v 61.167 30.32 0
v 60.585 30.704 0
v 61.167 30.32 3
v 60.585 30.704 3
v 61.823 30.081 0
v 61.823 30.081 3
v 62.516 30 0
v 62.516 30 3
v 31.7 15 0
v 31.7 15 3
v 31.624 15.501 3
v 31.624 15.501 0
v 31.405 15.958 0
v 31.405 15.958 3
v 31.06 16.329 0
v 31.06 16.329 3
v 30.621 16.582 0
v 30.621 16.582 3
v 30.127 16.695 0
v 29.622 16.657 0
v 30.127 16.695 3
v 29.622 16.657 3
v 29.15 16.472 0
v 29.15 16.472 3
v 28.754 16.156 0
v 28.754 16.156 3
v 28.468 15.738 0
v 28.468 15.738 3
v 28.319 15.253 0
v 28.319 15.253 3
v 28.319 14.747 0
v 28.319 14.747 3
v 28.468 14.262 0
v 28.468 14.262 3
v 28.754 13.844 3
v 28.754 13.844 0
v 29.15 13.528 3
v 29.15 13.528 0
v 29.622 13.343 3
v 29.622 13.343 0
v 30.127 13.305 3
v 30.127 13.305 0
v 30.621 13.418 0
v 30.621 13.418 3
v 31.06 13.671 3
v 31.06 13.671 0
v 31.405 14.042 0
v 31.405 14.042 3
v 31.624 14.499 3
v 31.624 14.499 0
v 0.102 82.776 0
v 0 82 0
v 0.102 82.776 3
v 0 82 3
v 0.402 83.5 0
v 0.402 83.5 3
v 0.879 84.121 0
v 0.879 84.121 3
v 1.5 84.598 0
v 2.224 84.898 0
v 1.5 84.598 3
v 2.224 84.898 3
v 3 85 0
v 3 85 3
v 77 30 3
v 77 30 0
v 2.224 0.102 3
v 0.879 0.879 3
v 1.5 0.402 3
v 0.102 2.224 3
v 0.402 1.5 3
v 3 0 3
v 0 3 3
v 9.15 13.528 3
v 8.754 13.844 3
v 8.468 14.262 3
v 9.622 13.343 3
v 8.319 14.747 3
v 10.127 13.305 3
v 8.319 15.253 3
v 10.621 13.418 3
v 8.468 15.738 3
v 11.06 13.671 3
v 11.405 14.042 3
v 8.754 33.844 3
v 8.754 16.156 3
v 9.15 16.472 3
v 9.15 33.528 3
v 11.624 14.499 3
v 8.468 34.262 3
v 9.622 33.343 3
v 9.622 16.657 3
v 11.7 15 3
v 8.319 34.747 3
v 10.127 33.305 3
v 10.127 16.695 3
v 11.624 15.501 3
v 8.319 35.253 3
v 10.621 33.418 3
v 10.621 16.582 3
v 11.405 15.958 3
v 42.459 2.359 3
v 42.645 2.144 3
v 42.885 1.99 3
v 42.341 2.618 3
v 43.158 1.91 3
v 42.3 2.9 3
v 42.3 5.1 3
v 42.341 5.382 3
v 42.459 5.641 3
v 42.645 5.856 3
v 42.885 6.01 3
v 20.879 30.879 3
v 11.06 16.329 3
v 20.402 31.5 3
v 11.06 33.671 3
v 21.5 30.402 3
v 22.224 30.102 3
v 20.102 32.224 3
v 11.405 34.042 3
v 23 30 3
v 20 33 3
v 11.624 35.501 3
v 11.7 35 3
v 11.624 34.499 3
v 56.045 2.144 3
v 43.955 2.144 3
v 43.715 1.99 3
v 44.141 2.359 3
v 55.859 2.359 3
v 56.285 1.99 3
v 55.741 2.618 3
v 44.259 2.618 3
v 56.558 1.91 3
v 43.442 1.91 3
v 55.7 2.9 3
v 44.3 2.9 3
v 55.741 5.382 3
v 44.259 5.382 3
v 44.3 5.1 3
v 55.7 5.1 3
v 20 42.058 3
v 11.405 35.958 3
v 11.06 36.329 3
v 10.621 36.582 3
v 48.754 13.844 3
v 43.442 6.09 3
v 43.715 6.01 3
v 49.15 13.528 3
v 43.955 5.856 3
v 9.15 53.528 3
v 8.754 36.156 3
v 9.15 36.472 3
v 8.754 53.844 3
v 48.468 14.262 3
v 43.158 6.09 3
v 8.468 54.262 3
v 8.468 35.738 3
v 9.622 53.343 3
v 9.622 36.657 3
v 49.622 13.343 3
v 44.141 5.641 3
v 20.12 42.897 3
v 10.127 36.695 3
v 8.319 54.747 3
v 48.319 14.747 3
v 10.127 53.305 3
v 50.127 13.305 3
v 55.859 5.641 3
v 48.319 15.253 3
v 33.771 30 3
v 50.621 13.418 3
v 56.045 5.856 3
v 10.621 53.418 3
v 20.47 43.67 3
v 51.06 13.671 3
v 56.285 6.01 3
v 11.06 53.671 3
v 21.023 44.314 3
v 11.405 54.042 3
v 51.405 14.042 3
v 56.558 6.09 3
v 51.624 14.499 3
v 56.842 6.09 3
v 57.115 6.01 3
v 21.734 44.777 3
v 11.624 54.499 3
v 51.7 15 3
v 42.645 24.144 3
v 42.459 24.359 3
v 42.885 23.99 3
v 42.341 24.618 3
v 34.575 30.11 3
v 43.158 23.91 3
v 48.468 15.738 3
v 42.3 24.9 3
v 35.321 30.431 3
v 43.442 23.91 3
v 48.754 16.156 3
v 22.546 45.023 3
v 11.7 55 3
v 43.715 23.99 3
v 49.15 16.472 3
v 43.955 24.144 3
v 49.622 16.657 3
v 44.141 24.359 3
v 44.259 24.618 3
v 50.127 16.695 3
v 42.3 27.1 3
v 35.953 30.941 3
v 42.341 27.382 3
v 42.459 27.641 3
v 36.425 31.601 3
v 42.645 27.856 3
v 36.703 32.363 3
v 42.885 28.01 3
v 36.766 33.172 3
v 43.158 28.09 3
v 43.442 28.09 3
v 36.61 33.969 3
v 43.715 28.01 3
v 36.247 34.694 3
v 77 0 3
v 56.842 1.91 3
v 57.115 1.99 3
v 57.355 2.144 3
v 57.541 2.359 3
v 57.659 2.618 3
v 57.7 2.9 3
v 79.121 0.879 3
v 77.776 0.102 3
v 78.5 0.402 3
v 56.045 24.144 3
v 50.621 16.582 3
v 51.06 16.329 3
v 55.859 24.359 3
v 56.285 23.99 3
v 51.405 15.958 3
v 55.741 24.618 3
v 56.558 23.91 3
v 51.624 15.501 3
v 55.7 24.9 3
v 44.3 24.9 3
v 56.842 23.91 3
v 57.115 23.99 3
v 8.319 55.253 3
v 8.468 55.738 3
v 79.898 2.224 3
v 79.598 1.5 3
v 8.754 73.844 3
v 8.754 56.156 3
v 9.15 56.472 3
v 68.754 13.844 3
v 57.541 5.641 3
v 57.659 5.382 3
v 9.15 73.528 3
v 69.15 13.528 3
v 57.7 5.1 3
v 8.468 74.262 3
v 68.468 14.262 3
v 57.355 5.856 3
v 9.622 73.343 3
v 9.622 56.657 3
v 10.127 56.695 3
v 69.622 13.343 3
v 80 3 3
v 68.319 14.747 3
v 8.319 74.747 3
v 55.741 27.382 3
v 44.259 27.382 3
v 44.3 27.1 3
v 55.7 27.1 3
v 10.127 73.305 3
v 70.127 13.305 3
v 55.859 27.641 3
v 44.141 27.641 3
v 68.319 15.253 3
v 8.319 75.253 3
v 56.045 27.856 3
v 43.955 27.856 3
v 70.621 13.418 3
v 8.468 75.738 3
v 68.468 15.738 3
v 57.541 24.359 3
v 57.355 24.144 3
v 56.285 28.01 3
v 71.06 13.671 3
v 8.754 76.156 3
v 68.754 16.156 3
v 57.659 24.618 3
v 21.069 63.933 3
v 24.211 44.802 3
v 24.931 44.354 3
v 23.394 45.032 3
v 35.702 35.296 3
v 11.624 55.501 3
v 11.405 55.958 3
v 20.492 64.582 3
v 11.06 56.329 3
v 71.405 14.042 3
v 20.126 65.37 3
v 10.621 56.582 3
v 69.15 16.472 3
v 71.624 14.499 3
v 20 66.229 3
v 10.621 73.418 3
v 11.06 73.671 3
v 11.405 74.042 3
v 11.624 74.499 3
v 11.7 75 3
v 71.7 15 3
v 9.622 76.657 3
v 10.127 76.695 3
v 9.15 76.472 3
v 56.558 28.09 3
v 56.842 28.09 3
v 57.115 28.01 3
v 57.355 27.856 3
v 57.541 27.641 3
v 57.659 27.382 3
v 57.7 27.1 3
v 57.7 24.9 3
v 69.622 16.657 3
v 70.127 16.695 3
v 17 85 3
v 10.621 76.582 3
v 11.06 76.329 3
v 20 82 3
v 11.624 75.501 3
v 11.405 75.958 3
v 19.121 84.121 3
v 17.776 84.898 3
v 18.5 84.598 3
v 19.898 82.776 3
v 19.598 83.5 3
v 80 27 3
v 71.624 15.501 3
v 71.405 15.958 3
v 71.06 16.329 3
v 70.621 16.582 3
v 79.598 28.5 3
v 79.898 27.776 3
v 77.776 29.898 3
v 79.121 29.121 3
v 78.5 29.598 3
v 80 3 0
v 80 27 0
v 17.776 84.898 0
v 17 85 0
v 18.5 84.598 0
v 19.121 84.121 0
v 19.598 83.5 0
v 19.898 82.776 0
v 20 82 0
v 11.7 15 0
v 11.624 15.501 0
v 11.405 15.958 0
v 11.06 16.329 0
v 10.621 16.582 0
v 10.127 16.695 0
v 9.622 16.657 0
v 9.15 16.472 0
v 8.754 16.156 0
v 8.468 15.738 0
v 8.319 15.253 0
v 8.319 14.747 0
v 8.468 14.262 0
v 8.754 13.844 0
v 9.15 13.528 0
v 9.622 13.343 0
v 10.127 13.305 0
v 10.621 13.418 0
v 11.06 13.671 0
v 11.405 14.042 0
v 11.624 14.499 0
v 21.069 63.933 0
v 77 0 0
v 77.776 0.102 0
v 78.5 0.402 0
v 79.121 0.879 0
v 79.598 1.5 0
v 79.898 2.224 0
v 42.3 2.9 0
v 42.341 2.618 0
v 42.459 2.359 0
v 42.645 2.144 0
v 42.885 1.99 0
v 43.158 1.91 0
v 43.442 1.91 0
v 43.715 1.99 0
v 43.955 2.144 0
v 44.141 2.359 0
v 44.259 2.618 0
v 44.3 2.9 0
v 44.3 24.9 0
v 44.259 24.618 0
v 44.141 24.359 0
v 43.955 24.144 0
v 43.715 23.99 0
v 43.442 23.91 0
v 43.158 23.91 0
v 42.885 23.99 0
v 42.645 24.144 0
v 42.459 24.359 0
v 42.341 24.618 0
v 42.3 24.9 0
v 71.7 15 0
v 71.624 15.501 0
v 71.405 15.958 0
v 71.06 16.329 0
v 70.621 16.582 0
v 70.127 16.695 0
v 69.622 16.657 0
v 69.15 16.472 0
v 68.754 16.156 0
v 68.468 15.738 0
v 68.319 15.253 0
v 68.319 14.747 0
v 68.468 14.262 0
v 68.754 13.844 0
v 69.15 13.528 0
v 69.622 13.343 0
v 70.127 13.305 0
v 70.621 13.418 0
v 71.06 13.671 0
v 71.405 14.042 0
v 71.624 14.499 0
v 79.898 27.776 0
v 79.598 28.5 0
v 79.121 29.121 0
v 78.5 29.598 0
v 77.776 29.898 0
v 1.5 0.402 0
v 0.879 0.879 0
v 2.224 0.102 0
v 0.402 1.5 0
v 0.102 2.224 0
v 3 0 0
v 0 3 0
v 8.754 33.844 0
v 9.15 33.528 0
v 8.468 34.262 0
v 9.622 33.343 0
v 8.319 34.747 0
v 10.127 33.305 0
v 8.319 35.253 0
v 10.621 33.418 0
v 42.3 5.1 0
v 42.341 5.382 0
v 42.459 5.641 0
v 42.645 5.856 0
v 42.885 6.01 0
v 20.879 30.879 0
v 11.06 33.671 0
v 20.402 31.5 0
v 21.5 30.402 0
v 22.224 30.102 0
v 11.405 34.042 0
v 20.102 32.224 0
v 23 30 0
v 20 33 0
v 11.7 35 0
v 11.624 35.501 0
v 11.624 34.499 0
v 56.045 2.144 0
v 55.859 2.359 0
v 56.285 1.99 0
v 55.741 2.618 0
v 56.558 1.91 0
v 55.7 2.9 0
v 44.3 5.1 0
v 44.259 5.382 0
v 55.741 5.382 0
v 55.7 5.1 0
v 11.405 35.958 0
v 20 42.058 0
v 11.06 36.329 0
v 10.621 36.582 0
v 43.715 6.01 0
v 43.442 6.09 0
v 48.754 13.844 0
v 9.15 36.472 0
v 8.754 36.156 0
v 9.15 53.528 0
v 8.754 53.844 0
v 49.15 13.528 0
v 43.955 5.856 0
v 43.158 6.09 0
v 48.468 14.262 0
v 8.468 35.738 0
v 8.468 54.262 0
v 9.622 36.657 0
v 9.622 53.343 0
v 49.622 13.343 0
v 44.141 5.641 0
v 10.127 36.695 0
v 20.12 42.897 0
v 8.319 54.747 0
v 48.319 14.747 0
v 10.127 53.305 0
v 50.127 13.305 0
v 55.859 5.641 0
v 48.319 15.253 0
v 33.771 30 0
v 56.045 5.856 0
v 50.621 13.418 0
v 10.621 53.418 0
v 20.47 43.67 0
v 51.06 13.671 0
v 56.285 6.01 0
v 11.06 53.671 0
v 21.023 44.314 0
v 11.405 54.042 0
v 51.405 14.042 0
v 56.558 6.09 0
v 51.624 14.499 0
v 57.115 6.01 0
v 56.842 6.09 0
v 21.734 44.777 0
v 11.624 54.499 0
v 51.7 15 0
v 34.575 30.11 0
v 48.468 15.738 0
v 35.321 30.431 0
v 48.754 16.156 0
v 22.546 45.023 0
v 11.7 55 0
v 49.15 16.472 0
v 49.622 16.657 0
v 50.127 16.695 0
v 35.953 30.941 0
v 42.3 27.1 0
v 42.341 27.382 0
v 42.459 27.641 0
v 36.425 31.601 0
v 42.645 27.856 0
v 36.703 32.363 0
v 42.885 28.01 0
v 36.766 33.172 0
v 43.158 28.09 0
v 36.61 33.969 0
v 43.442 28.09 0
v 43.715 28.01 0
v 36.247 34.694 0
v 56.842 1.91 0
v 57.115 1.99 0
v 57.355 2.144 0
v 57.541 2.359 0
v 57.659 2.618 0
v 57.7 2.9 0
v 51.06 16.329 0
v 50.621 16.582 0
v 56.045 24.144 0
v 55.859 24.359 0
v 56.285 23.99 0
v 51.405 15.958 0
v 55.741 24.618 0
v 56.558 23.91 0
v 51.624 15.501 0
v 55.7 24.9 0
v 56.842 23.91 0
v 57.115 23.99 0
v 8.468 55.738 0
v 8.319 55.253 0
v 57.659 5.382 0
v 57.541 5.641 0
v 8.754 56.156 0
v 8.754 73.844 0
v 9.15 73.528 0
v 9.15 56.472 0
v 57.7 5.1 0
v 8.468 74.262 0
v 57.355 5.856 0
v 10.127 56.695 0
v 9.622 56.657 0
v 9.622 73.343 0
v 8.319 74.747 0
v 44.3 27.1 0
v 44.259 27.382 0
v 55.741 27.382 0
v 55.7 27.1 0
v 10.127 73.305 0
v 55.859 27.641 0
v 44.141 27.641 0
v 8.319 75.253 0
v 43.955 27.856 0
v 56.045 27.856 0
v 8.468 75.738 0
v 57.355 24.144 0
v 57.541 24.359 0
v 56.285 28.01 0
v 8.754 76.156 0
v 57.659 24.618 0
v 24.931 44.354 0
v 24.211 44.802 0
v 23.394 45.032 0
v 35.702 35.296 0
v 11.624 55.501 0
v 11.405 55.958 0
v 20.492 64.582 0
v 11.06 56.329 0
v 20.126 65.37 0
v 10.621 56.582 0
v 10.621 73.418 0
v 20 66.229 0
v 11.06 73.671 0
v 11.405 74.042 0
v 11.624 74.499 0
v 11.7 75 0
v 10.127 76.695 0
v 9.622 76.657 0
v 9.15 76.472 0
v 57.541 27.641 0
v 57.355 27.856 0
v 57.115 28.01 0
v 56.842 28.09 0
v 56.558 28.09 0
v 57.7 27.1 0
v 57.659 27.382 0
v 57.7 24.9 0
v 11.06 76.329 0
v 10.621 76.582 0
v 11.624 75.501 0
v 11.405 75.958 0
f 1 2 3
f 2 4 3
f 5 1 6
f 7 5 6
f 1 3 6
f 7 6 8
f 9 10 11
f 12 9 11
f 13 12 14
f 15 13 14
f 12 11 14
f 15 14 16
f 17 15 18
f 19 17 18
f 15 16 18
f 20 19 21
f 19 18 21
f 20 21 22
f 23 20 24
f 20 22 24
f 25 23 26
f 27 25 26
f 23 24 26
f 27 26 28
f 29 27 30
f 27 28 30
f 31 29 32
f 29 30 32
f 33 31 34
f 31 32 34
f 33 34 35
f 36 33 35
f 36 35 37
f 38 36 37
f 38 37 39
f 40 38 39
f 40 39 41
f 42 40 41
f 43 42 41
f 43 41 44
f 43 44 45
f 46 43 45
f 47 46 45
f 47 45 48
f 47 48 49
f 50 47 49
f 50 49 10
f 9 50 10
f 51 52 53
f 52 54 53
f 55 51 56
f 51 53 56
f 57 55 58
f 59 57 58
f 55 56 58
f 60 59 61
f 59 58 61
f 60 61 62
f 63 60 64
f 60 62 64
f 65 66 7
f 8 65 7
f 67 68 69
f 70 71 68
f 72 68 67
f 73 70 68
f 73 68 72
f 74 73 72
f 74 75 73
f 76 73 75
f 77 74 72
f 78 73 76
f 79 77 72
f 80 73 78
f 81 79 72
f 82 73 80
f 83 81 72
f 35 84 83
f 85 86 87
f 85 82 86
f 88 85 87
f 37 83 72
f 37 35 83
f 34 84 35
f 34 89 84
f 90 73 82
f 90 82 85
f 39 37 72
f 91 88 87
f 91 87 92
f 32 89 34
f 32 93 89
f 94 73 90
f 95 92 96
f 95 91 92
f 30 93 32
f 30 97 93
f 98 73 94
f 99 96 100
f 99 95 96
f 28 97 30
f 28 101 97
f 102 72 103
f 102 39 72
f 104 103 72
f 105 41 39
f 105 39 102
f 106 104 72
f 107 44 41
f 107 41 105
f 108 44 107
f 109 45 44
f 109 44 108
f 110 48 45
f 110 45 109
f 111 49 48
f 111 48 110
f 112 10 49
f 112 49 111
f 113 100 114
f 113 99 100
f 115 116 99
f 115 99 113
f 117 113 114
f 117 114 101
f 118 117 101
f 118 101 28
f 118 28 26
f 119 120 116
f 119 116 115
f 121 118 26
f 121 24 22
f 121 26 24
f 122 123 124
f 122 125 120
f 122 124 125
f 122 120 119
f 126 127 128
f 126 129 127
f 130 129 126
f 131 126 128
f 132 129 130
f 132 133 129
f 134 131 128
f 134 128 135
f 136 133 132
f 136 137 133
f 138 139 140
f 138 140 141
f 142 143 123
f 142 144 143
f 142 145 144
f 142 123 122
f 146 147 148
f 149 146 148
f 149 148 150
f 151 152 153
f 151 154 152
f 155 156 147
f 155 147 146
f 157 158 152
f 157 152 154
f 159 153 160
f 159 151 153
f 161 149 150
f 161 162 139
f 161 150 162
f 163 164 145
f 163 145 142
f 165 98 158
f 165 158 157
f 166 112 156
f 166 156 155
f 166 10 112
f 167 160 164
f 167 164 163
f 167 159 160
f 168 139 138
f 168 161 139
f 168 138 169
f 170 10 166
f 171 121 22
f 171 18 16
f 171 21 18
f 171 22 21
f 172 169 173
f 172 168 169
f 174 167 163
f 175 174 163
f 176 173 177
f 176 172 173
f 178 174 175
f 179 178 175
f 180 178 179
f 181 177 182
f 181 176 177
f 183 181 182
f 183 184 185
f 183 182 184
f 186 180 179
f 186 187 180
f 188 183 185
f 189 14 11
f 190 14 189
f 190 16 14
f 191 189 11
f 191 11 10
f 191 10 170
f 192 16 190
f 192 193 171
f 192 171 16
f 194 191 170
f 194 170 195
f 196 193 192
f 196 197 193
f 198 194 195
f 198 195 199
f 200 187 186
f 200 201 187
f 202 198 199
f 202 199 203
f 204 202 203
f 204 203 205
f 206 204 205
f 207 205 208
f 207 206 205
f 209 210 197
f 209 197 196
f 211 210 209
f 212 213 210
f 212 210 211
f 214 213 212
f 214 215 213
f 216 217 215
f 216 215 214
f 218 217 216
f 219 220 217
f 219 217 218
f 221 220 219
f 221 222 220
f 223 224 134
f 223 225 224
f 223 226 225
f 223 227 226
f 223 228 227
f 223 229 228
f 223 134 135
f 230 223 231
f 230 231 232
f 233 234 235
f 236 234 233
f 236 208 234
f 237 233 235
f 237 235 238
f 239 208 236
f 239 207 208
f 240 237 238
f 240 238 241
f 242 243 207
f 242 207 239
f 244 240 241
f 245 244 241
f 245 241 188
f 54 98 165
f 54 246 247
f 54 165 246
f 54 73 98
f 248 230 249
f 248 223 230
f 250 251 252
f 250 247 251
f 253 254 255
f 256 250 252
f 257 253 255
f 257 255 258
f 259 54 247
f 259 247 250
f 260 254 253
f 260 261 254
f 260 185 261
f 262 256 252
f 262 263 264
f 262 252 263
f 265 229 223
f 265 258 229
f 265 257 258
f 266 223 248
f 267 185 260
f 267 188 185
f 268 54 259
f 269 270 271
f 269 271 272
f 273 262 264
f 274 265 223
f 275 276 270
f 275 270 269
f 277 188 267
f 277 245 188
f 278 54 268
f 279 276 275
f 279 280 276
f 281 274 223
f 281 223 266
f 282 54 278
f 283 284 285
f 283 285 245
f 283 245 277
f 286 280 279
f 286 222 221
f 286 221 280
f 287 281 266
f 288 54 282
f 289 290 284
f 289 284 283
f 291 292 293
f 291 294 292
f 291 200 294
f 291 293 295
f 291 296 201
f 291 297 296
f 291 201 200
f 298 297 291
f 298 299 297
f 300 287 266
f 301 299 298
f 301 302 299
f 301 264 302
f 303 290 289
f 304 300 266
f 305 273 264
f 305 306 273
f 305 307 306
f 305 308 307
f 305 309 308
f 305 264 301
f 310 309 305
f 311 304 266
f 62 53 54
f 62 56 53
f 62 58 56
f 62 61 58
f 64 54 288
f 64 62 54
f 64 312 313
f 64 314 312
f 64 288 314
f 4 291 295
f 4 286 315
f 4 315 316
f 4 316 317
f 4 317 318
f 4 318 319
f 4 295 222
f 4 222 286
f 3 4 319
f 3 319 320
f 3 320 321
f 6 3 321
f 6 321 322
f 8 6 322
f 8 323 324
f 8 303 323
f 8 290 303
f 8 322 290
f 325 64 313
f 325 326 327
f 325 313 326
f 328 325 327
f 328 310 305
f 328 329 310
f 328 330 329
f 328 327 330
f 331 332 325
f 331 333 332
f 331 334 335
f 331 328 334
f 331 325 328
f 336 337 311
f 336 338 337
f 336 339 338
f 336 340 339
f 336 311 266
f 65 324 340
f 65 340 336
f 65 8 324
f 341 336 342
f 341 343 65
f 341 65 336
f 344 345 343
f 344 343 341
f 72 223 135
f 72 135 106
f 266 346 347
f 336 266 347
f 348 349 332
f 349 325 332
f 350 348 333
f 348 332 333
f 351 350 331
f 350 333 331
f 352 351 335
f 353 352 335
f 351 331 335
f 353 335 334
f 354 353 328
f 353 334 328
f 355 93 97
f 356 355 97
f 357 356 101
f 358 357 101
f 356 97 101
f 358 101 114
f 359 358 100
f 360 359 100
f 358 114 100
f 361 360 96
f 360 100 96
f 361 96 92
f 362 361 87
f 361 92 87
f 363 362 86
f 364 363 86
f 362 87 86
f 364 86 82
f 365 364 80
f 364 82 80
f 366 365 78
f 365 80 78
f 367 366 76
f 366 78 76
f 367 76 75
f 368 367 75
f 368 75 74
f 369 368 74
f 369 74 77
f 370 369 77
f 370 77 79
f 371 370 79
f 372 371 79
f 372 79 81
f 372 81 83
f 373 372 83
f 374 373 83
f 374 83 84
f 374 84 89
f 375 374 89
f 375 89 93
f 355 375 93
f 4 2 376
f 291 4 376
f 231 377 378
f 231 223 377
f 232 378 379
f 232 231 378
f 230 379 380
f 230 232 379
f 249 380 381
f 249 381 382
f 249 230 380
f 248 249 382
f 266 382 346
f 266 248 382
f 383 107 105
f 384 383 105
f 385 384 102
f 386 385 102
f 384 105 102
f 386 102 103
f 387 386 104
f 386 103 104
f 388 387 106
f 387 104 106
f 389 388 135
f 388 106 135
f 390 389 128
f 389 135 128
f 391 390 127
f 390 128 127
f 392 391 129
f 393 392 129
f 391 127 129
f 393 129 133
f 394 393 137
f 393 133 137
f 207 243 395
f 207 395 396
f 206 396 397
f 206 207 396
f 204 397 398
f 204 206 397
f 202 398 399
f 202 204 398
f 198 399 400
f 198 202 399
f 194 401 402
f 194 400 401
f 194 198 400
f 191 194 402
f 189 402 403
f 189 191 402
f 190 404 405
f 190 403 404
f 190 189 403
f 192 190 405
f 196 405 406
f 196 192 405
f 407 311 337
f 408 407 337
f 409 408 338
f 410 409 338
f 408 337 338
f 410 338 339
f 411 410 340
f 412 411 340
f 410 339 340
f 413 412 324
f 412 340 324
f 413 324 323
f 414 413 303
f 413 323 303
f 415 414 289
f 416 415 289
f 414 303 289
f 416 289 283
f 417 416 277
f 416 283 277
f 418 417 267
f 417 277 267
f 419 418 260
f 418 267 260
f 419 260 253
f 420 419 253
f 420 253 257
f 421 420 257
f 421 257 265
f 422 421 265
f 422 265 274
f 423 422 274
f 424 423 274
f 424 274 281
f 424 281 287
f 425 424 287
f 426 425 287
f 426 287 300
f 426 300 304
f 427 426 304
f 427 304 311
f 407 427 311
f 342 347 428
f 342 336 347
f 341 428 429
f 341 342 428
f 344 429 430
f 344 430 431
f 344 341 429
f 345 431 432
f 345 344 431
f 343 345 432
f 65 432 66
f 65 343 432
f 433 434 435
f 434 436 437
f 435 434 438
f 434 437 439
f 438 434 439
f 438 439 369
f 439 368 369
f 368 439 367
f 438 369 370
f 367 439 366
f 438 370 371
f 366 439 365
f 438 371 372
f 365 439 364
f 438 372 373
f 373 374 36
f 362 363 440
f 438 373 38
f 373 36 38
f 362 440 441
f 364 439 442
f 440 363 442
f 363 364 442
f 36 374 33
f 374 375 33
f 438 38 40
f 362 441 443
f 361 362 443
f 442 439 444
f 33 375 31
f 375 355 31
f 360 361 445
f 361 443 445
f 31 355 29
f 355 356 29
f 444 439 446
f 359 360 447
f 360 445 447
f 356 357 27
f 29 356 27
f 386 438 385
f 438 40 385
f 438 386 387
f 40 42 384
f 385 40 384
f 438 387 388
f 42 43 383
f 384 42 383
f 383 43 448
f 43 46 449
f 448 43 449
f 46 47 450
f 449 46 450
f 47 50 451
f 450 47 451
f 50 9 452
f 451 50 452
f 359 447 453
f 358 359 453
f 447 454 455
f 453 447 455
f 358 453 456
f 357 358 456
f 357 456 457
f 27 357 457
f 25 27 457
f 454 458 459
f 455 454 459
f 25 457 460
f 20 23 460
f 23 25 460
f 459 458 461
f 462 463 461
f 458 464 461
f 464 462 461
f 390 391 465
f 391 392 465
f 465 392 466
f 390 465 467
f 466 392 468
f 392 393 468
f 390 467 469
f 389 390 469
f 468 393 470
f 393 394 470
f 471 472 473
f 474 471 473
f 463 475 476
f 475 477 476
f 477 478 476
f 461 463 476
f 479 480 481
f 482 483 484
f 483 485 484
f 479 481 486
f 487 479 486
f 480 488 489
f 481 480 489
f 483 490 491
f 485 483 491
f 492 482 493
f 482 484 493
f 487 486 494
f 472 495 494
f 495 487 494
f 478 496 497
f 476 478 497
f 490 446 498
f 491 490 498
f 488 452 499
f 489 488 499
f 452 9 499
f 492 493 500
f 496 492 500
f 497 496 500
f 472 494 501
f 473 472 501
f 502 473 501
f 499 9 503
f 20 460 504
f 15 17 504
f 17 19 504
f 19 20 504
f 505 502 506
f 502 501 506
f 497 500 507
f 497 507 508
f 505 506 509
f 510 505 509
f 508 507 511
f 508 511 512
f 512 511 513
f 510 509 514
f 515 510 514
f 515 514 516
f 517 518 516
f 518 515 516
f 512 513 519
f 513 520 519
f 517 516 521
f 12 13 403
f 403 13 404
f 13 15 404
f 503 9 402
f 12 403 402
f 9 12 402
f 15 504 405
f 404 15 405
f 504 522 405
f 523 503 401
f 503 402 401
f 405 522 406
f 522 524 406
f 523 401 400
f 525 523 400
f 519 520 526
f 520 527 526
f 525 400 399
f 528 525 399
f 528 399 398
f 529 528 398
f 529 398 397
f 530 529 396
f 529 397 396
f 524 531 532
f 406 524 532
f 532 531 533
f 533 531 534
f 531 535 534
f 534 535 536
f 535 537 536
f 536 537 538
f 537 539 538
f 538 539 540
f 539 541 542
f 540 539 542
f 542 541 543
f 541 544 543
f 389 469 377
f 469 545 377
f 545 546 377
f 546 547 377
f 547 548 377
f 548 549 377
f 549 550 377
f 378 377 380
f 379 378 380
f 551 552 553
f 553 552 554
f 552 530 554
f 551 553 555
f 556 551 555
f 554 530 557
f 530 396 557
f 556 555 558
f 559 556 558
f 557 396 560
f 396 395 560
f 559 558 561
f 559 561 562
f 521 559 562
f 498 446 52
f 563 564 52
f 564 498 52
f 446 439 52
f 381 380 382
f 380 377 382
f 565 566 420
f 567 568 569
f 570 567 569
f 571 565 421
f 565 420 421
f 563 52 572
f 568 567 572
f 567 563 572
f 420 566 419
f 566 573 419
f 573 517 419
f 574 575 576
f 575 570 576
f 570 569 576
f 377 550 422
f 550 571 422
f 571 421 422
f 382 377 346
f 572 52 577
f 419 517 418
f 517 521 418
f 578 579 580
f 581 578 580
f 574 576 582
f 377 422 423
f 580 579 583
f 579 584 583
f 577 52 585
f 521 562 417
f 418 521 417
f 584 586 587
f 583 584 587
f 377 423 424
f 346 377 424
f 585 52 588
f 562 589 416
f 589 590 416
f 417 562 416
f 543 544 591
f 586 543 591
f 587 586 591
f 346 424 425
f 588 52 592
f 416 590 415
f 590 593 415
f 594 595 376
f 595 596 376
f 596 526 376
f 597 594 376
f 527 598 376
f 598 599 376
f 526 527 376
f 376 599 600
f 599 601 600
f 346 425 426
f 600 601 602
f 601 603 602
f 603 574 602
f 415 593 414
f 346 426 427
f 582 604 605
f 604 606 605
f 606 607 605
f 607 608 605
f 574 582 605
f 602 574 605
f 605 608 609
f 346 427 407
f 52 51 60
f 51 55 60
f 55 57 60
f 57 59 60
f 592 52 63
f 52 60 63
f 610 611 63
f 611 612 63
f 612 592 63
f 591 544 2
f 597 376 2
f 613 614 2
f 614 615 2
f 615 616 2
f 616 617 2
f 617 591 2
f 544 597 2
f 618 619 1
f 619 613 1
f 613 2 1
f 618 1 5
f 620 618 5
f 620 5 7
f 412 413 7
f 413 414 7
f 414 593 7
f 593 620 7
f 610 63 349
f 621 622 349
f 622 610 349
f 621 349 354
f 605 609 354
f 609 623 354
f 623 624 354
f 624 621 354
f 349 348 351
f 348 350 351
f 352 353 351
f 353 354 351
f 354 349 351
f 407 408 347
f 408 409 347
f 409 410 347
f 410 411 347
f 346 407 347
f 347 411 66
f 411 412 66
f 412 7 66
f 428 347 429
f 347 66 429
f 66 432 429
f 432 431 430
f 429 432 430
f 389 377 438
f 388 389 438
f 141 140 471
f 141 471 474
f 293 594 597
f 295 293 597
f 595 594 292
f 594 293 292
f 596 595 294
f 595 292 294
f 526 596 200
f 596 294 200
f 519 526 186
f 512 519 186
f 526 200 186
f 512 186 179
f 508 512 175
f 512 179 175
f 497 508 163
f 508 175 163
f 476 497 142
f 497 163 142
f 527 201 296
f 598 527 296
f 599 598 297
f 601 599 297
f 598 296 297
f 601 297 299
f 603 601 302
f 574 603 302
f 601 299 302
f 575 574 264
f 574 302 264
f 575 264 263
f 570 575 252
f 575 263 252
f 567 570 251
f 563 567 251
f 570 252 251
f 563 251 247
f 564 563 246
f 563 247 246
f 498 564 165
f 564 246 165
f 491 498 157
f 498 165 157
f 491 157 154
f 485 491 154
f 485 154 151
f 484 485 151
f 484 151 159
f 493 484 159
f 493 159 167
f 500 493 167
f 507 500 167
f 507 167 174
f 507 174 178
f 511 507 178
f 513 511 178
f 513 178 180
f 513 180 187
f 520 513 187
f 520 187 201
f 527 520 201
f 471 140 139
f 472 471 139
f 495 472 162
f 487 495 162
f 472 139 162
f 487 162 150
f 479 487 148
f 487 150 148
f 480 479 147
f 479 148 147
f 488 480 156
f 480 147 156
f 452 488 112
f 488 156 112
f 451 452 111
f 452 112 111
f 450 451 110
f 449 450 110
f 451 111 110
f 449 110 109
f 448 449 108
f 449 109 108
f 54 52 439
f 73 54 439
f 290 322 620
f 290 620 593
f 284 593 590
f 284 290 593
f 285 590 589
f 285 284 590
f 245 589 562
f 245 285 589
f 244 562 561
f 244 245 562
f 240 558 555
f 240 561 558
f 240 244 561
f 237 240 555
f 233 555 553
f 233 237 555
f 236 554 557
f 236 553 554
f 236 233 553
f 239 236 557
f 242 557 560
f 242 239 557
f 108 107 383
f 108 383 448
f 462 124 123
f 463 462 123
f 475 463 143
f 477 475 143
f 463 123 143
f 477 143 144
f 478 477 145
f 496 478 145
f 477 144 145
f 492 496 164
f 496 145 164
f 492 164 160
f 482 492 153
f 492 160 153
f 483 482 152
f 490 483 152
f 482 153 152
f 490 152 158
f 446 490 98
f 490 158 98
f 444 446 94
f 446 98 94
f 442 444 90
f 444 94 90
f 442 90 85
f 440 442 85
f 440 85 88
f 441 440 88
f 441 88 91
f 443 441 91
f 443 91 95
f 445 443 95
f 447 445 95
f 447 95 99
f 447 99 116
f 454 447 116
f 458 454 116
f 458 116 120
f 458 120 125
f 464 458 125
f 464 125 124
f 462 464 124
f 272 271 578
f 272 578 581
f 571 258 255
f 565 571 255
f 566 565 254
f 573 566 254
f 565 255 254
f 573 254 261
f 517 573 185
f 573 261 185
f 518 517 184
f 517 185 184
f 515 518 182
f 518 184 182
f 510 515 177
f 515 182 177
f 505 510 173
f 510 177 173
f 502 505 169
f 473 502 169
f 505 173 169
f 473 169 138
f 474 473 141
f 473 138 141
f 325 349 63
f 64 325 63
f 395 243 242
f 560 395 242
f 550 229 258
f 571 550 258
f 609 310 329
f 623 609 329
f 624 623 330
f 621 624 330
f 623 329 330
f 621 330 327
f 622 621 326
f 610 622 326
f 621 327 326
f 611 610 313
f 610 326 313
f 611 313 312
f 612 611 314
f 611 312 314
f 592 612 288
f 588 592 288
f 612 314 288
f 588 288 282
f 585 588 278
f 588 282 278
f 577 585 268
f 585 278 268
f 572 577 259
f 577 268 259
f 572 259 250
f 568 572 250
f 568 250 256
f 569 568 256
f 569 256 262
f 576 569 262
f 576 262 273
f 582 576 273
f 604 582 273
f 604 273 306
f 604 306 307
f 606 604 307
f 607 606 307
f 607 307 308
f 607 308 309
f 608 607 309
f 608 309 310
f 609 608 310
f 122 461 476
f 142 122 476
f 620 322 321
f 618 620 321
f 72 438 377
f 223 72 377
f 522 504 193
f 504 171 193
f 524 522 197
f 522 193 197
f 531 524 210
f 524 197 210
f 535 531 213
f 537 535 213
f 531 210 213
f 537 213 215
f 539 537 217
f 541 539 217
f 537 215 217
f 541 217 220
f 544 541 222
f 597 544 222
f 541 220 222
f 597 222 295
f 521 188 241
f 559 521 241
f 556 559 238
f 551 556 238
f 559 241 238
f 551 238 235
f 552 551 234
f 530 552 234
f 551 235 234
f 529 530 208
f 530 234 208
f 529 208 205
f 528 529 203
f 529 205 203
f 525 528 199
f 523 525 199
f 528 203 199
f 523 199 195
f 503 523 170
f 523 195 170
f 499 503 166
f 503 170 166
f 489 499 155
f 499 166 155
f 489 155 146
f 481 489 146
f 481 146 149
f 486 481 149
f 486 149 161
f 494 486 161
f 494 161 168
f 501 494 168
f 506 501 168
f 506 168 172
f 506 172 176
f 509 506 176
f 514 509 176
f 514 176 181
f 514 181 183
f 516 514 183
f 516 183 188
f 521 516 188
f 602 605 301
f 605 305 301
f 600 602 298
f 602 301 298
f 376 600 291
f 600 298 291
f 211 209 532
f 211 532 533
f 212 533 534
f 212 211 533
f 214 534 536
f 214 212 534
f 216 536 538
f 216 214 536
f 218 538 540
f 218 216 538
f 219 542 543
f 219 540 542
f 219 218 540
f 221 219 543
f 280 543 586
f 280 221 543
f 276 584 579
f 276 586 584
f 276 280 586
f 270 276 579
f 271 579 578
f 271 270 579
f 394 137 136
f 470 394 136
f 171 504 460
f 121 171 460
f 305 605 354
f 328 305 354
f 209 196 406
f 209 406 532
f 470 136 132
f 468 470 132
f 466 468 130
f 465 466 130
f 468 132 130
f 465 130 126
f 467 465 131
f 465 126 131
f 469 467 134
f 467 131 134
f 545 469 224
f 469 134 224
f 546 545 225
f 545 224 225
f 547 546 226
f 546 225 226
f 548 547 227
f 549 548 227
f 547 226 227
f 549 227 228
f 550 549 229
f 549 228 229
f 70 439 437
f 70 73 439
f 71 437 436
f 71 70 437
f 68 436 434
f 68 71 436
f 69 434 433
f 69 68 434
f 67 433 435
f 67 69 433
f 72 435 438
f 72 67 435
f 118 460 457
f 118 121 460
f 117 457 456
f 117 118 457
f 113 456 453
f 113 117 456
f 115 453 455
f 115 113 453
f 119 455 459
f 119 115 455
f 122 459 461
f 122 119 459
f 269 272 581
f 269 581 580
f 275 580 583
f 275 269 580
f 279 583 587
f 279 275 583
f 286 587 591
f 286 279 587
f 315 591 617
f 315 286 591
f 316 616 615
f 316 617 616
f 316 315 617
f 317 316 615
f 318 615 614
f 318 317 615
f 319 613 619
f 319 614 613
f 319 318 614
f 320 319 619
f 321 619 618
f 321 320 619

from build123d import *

# Parameters (mm, degrees)
EXTRUDE_1_DEPTH     = 3
SKETCH_2_R          = 1.7
CUT_EXTRUDE_1_DEPTH = 117.764720699
SKETCH_3_W          = 15.4
SKETCH_3_H          = 2.2
CUT_EXTRUDE_2_DEPTH = 10
CUT_EXTRUDE_3_DEPTH = 10
FILLET_1_R          = 3
FILLET_2_R          = 3


with BuildPart() as part:
    # 草图1 → 凸台-拉伸1 (new body)
    with BuildSketch(Plane.XY):
        Polygon((0, 85), (0, 0), (80, 0), (80, 30), (61.422003178, 30), (20, 64.832139036), (20, 85), align=None)
        Polygon((20, 30), (20, 48.5), (42, 30), align=None, mode=Mode.SUBTRACT)
    extrude(amount=EXTRUDE_1_DEPTH)

    # 草图2 → 切除-拉伸1 (cut, through all)
    with BuildSketch(Plane.XY.offset(3)):
        with Locations((10, 75)):
            Circle(SKETCH_2_R)
        with Locations((10, 55)):
            Circle(SKETCH_2_R)
        with Locations((10, 35)):
            Circle(SKETCH_2_R)
        with Locations((30, 15)):
            Circle(SKETCH_2_R)
        with Locations((50, 15)):
            Circle(SKETCH_2_R)
        with Locations((70, 15)):
            Circle(SKETCH_2_R)
        with Locations((10, 15)):
            Circle(SKETCH_2_R)
    extrude(amount=-CUT_EXTRUDE_1_DEPTH, mode=Mode.SUBTRACT)

    # 草图3 → 切除-拉伸2 (cut)
    with BuildSketch(Plane.XY.offset(3)):
        with Locations((50, 26)):
            Rectangle(SKETCH_3_W, SKETCH_3_H)
        with Locations((50, 4)):
            Rectangle(SKETCH_3_W, SKETCH_3_H)
    extrude(amount=-CUT_EXTRUDE_2_DEPTH, mode=Mode.SUBTRACT)

    # 草图4 → 切除-拉伸3 (cut)
    with BuildSketch(Plane.XY.offset(3)):
        with BuildLine():
            Line((44.3, 27.1), (55.7, 27.1))
            ThreePointArc((55.7, 27.1), (56.7, 28.1), (57.7, 27.1))
            Line((57.7, 27.1), (57.7, 24.9))
            ThreePointArc((57.7, 24.9), (56.7, 23.9), (55.7, 24.9))
            Line((55.7, 24.9), (44.3, 24.9))
            ThreePointArc((44.3, 24.9), (43.3, 23.9), (42.3, 24.9))
            Line((42.3, 24.9), (42.3, 27.1))
            ThreePointArc((42.3, 27.1), (43.3, 28.1), (44.3, 27.1))
        make_face()
        with BuildLine():
            Line((42.3, 5.1), (42.3, 2.9))
            ThreePointArc((42.3, 2.9), (43.3, 1.9), (44.3, 2.9))
            Line((44.3, 2.9), (55.7, 2.9))
            ThreePointArc((55.7, 2.9), (56.7, 1.9), (57.7, 2.9))
            Line((57.7, 2.9), (57.7, 5.1))
            ThreePointArc((57.7, 5.1), (56.7, 6.1), (55.7, 5.1))
            Line((55.7, 5.1), (44.3, 5.1))
            ThreePointArc((44.3, 5.1), (43.3, 6.1), (42.3, 5.1))
        make_face()
    extrude(amount=-CUT_EXTRUDE_3_DEPTH, mode=Mode.SUBTRACT)

    # 圆角1
    fillet_1_edges = [part.edges().sort_by_distance(p)[0] for p in [
        (20, 85, 1.5),
        (20, 64.832139036, 1.5),
        (61.422003178, 30, 1.5),
        (80, 30, 1.5),
        (80, 0, 1.5),
        (0, 0, 1.5),
        (0, 85, 1.5),
    ]]
    fillet(fillet_1_edges, radius=FILLET_1_R)

    # 圆角2
    fillet_2_edges = [part.edges().sort_by_distance(p)[0] for p in [
        (20, 30, 1.5),
        (42, 30, 1.5),
        (20, 48.5, 1.5),
    ]]
    fillet(fillet_2_edges, radius=FILLET_2_R)


solid = part.part
